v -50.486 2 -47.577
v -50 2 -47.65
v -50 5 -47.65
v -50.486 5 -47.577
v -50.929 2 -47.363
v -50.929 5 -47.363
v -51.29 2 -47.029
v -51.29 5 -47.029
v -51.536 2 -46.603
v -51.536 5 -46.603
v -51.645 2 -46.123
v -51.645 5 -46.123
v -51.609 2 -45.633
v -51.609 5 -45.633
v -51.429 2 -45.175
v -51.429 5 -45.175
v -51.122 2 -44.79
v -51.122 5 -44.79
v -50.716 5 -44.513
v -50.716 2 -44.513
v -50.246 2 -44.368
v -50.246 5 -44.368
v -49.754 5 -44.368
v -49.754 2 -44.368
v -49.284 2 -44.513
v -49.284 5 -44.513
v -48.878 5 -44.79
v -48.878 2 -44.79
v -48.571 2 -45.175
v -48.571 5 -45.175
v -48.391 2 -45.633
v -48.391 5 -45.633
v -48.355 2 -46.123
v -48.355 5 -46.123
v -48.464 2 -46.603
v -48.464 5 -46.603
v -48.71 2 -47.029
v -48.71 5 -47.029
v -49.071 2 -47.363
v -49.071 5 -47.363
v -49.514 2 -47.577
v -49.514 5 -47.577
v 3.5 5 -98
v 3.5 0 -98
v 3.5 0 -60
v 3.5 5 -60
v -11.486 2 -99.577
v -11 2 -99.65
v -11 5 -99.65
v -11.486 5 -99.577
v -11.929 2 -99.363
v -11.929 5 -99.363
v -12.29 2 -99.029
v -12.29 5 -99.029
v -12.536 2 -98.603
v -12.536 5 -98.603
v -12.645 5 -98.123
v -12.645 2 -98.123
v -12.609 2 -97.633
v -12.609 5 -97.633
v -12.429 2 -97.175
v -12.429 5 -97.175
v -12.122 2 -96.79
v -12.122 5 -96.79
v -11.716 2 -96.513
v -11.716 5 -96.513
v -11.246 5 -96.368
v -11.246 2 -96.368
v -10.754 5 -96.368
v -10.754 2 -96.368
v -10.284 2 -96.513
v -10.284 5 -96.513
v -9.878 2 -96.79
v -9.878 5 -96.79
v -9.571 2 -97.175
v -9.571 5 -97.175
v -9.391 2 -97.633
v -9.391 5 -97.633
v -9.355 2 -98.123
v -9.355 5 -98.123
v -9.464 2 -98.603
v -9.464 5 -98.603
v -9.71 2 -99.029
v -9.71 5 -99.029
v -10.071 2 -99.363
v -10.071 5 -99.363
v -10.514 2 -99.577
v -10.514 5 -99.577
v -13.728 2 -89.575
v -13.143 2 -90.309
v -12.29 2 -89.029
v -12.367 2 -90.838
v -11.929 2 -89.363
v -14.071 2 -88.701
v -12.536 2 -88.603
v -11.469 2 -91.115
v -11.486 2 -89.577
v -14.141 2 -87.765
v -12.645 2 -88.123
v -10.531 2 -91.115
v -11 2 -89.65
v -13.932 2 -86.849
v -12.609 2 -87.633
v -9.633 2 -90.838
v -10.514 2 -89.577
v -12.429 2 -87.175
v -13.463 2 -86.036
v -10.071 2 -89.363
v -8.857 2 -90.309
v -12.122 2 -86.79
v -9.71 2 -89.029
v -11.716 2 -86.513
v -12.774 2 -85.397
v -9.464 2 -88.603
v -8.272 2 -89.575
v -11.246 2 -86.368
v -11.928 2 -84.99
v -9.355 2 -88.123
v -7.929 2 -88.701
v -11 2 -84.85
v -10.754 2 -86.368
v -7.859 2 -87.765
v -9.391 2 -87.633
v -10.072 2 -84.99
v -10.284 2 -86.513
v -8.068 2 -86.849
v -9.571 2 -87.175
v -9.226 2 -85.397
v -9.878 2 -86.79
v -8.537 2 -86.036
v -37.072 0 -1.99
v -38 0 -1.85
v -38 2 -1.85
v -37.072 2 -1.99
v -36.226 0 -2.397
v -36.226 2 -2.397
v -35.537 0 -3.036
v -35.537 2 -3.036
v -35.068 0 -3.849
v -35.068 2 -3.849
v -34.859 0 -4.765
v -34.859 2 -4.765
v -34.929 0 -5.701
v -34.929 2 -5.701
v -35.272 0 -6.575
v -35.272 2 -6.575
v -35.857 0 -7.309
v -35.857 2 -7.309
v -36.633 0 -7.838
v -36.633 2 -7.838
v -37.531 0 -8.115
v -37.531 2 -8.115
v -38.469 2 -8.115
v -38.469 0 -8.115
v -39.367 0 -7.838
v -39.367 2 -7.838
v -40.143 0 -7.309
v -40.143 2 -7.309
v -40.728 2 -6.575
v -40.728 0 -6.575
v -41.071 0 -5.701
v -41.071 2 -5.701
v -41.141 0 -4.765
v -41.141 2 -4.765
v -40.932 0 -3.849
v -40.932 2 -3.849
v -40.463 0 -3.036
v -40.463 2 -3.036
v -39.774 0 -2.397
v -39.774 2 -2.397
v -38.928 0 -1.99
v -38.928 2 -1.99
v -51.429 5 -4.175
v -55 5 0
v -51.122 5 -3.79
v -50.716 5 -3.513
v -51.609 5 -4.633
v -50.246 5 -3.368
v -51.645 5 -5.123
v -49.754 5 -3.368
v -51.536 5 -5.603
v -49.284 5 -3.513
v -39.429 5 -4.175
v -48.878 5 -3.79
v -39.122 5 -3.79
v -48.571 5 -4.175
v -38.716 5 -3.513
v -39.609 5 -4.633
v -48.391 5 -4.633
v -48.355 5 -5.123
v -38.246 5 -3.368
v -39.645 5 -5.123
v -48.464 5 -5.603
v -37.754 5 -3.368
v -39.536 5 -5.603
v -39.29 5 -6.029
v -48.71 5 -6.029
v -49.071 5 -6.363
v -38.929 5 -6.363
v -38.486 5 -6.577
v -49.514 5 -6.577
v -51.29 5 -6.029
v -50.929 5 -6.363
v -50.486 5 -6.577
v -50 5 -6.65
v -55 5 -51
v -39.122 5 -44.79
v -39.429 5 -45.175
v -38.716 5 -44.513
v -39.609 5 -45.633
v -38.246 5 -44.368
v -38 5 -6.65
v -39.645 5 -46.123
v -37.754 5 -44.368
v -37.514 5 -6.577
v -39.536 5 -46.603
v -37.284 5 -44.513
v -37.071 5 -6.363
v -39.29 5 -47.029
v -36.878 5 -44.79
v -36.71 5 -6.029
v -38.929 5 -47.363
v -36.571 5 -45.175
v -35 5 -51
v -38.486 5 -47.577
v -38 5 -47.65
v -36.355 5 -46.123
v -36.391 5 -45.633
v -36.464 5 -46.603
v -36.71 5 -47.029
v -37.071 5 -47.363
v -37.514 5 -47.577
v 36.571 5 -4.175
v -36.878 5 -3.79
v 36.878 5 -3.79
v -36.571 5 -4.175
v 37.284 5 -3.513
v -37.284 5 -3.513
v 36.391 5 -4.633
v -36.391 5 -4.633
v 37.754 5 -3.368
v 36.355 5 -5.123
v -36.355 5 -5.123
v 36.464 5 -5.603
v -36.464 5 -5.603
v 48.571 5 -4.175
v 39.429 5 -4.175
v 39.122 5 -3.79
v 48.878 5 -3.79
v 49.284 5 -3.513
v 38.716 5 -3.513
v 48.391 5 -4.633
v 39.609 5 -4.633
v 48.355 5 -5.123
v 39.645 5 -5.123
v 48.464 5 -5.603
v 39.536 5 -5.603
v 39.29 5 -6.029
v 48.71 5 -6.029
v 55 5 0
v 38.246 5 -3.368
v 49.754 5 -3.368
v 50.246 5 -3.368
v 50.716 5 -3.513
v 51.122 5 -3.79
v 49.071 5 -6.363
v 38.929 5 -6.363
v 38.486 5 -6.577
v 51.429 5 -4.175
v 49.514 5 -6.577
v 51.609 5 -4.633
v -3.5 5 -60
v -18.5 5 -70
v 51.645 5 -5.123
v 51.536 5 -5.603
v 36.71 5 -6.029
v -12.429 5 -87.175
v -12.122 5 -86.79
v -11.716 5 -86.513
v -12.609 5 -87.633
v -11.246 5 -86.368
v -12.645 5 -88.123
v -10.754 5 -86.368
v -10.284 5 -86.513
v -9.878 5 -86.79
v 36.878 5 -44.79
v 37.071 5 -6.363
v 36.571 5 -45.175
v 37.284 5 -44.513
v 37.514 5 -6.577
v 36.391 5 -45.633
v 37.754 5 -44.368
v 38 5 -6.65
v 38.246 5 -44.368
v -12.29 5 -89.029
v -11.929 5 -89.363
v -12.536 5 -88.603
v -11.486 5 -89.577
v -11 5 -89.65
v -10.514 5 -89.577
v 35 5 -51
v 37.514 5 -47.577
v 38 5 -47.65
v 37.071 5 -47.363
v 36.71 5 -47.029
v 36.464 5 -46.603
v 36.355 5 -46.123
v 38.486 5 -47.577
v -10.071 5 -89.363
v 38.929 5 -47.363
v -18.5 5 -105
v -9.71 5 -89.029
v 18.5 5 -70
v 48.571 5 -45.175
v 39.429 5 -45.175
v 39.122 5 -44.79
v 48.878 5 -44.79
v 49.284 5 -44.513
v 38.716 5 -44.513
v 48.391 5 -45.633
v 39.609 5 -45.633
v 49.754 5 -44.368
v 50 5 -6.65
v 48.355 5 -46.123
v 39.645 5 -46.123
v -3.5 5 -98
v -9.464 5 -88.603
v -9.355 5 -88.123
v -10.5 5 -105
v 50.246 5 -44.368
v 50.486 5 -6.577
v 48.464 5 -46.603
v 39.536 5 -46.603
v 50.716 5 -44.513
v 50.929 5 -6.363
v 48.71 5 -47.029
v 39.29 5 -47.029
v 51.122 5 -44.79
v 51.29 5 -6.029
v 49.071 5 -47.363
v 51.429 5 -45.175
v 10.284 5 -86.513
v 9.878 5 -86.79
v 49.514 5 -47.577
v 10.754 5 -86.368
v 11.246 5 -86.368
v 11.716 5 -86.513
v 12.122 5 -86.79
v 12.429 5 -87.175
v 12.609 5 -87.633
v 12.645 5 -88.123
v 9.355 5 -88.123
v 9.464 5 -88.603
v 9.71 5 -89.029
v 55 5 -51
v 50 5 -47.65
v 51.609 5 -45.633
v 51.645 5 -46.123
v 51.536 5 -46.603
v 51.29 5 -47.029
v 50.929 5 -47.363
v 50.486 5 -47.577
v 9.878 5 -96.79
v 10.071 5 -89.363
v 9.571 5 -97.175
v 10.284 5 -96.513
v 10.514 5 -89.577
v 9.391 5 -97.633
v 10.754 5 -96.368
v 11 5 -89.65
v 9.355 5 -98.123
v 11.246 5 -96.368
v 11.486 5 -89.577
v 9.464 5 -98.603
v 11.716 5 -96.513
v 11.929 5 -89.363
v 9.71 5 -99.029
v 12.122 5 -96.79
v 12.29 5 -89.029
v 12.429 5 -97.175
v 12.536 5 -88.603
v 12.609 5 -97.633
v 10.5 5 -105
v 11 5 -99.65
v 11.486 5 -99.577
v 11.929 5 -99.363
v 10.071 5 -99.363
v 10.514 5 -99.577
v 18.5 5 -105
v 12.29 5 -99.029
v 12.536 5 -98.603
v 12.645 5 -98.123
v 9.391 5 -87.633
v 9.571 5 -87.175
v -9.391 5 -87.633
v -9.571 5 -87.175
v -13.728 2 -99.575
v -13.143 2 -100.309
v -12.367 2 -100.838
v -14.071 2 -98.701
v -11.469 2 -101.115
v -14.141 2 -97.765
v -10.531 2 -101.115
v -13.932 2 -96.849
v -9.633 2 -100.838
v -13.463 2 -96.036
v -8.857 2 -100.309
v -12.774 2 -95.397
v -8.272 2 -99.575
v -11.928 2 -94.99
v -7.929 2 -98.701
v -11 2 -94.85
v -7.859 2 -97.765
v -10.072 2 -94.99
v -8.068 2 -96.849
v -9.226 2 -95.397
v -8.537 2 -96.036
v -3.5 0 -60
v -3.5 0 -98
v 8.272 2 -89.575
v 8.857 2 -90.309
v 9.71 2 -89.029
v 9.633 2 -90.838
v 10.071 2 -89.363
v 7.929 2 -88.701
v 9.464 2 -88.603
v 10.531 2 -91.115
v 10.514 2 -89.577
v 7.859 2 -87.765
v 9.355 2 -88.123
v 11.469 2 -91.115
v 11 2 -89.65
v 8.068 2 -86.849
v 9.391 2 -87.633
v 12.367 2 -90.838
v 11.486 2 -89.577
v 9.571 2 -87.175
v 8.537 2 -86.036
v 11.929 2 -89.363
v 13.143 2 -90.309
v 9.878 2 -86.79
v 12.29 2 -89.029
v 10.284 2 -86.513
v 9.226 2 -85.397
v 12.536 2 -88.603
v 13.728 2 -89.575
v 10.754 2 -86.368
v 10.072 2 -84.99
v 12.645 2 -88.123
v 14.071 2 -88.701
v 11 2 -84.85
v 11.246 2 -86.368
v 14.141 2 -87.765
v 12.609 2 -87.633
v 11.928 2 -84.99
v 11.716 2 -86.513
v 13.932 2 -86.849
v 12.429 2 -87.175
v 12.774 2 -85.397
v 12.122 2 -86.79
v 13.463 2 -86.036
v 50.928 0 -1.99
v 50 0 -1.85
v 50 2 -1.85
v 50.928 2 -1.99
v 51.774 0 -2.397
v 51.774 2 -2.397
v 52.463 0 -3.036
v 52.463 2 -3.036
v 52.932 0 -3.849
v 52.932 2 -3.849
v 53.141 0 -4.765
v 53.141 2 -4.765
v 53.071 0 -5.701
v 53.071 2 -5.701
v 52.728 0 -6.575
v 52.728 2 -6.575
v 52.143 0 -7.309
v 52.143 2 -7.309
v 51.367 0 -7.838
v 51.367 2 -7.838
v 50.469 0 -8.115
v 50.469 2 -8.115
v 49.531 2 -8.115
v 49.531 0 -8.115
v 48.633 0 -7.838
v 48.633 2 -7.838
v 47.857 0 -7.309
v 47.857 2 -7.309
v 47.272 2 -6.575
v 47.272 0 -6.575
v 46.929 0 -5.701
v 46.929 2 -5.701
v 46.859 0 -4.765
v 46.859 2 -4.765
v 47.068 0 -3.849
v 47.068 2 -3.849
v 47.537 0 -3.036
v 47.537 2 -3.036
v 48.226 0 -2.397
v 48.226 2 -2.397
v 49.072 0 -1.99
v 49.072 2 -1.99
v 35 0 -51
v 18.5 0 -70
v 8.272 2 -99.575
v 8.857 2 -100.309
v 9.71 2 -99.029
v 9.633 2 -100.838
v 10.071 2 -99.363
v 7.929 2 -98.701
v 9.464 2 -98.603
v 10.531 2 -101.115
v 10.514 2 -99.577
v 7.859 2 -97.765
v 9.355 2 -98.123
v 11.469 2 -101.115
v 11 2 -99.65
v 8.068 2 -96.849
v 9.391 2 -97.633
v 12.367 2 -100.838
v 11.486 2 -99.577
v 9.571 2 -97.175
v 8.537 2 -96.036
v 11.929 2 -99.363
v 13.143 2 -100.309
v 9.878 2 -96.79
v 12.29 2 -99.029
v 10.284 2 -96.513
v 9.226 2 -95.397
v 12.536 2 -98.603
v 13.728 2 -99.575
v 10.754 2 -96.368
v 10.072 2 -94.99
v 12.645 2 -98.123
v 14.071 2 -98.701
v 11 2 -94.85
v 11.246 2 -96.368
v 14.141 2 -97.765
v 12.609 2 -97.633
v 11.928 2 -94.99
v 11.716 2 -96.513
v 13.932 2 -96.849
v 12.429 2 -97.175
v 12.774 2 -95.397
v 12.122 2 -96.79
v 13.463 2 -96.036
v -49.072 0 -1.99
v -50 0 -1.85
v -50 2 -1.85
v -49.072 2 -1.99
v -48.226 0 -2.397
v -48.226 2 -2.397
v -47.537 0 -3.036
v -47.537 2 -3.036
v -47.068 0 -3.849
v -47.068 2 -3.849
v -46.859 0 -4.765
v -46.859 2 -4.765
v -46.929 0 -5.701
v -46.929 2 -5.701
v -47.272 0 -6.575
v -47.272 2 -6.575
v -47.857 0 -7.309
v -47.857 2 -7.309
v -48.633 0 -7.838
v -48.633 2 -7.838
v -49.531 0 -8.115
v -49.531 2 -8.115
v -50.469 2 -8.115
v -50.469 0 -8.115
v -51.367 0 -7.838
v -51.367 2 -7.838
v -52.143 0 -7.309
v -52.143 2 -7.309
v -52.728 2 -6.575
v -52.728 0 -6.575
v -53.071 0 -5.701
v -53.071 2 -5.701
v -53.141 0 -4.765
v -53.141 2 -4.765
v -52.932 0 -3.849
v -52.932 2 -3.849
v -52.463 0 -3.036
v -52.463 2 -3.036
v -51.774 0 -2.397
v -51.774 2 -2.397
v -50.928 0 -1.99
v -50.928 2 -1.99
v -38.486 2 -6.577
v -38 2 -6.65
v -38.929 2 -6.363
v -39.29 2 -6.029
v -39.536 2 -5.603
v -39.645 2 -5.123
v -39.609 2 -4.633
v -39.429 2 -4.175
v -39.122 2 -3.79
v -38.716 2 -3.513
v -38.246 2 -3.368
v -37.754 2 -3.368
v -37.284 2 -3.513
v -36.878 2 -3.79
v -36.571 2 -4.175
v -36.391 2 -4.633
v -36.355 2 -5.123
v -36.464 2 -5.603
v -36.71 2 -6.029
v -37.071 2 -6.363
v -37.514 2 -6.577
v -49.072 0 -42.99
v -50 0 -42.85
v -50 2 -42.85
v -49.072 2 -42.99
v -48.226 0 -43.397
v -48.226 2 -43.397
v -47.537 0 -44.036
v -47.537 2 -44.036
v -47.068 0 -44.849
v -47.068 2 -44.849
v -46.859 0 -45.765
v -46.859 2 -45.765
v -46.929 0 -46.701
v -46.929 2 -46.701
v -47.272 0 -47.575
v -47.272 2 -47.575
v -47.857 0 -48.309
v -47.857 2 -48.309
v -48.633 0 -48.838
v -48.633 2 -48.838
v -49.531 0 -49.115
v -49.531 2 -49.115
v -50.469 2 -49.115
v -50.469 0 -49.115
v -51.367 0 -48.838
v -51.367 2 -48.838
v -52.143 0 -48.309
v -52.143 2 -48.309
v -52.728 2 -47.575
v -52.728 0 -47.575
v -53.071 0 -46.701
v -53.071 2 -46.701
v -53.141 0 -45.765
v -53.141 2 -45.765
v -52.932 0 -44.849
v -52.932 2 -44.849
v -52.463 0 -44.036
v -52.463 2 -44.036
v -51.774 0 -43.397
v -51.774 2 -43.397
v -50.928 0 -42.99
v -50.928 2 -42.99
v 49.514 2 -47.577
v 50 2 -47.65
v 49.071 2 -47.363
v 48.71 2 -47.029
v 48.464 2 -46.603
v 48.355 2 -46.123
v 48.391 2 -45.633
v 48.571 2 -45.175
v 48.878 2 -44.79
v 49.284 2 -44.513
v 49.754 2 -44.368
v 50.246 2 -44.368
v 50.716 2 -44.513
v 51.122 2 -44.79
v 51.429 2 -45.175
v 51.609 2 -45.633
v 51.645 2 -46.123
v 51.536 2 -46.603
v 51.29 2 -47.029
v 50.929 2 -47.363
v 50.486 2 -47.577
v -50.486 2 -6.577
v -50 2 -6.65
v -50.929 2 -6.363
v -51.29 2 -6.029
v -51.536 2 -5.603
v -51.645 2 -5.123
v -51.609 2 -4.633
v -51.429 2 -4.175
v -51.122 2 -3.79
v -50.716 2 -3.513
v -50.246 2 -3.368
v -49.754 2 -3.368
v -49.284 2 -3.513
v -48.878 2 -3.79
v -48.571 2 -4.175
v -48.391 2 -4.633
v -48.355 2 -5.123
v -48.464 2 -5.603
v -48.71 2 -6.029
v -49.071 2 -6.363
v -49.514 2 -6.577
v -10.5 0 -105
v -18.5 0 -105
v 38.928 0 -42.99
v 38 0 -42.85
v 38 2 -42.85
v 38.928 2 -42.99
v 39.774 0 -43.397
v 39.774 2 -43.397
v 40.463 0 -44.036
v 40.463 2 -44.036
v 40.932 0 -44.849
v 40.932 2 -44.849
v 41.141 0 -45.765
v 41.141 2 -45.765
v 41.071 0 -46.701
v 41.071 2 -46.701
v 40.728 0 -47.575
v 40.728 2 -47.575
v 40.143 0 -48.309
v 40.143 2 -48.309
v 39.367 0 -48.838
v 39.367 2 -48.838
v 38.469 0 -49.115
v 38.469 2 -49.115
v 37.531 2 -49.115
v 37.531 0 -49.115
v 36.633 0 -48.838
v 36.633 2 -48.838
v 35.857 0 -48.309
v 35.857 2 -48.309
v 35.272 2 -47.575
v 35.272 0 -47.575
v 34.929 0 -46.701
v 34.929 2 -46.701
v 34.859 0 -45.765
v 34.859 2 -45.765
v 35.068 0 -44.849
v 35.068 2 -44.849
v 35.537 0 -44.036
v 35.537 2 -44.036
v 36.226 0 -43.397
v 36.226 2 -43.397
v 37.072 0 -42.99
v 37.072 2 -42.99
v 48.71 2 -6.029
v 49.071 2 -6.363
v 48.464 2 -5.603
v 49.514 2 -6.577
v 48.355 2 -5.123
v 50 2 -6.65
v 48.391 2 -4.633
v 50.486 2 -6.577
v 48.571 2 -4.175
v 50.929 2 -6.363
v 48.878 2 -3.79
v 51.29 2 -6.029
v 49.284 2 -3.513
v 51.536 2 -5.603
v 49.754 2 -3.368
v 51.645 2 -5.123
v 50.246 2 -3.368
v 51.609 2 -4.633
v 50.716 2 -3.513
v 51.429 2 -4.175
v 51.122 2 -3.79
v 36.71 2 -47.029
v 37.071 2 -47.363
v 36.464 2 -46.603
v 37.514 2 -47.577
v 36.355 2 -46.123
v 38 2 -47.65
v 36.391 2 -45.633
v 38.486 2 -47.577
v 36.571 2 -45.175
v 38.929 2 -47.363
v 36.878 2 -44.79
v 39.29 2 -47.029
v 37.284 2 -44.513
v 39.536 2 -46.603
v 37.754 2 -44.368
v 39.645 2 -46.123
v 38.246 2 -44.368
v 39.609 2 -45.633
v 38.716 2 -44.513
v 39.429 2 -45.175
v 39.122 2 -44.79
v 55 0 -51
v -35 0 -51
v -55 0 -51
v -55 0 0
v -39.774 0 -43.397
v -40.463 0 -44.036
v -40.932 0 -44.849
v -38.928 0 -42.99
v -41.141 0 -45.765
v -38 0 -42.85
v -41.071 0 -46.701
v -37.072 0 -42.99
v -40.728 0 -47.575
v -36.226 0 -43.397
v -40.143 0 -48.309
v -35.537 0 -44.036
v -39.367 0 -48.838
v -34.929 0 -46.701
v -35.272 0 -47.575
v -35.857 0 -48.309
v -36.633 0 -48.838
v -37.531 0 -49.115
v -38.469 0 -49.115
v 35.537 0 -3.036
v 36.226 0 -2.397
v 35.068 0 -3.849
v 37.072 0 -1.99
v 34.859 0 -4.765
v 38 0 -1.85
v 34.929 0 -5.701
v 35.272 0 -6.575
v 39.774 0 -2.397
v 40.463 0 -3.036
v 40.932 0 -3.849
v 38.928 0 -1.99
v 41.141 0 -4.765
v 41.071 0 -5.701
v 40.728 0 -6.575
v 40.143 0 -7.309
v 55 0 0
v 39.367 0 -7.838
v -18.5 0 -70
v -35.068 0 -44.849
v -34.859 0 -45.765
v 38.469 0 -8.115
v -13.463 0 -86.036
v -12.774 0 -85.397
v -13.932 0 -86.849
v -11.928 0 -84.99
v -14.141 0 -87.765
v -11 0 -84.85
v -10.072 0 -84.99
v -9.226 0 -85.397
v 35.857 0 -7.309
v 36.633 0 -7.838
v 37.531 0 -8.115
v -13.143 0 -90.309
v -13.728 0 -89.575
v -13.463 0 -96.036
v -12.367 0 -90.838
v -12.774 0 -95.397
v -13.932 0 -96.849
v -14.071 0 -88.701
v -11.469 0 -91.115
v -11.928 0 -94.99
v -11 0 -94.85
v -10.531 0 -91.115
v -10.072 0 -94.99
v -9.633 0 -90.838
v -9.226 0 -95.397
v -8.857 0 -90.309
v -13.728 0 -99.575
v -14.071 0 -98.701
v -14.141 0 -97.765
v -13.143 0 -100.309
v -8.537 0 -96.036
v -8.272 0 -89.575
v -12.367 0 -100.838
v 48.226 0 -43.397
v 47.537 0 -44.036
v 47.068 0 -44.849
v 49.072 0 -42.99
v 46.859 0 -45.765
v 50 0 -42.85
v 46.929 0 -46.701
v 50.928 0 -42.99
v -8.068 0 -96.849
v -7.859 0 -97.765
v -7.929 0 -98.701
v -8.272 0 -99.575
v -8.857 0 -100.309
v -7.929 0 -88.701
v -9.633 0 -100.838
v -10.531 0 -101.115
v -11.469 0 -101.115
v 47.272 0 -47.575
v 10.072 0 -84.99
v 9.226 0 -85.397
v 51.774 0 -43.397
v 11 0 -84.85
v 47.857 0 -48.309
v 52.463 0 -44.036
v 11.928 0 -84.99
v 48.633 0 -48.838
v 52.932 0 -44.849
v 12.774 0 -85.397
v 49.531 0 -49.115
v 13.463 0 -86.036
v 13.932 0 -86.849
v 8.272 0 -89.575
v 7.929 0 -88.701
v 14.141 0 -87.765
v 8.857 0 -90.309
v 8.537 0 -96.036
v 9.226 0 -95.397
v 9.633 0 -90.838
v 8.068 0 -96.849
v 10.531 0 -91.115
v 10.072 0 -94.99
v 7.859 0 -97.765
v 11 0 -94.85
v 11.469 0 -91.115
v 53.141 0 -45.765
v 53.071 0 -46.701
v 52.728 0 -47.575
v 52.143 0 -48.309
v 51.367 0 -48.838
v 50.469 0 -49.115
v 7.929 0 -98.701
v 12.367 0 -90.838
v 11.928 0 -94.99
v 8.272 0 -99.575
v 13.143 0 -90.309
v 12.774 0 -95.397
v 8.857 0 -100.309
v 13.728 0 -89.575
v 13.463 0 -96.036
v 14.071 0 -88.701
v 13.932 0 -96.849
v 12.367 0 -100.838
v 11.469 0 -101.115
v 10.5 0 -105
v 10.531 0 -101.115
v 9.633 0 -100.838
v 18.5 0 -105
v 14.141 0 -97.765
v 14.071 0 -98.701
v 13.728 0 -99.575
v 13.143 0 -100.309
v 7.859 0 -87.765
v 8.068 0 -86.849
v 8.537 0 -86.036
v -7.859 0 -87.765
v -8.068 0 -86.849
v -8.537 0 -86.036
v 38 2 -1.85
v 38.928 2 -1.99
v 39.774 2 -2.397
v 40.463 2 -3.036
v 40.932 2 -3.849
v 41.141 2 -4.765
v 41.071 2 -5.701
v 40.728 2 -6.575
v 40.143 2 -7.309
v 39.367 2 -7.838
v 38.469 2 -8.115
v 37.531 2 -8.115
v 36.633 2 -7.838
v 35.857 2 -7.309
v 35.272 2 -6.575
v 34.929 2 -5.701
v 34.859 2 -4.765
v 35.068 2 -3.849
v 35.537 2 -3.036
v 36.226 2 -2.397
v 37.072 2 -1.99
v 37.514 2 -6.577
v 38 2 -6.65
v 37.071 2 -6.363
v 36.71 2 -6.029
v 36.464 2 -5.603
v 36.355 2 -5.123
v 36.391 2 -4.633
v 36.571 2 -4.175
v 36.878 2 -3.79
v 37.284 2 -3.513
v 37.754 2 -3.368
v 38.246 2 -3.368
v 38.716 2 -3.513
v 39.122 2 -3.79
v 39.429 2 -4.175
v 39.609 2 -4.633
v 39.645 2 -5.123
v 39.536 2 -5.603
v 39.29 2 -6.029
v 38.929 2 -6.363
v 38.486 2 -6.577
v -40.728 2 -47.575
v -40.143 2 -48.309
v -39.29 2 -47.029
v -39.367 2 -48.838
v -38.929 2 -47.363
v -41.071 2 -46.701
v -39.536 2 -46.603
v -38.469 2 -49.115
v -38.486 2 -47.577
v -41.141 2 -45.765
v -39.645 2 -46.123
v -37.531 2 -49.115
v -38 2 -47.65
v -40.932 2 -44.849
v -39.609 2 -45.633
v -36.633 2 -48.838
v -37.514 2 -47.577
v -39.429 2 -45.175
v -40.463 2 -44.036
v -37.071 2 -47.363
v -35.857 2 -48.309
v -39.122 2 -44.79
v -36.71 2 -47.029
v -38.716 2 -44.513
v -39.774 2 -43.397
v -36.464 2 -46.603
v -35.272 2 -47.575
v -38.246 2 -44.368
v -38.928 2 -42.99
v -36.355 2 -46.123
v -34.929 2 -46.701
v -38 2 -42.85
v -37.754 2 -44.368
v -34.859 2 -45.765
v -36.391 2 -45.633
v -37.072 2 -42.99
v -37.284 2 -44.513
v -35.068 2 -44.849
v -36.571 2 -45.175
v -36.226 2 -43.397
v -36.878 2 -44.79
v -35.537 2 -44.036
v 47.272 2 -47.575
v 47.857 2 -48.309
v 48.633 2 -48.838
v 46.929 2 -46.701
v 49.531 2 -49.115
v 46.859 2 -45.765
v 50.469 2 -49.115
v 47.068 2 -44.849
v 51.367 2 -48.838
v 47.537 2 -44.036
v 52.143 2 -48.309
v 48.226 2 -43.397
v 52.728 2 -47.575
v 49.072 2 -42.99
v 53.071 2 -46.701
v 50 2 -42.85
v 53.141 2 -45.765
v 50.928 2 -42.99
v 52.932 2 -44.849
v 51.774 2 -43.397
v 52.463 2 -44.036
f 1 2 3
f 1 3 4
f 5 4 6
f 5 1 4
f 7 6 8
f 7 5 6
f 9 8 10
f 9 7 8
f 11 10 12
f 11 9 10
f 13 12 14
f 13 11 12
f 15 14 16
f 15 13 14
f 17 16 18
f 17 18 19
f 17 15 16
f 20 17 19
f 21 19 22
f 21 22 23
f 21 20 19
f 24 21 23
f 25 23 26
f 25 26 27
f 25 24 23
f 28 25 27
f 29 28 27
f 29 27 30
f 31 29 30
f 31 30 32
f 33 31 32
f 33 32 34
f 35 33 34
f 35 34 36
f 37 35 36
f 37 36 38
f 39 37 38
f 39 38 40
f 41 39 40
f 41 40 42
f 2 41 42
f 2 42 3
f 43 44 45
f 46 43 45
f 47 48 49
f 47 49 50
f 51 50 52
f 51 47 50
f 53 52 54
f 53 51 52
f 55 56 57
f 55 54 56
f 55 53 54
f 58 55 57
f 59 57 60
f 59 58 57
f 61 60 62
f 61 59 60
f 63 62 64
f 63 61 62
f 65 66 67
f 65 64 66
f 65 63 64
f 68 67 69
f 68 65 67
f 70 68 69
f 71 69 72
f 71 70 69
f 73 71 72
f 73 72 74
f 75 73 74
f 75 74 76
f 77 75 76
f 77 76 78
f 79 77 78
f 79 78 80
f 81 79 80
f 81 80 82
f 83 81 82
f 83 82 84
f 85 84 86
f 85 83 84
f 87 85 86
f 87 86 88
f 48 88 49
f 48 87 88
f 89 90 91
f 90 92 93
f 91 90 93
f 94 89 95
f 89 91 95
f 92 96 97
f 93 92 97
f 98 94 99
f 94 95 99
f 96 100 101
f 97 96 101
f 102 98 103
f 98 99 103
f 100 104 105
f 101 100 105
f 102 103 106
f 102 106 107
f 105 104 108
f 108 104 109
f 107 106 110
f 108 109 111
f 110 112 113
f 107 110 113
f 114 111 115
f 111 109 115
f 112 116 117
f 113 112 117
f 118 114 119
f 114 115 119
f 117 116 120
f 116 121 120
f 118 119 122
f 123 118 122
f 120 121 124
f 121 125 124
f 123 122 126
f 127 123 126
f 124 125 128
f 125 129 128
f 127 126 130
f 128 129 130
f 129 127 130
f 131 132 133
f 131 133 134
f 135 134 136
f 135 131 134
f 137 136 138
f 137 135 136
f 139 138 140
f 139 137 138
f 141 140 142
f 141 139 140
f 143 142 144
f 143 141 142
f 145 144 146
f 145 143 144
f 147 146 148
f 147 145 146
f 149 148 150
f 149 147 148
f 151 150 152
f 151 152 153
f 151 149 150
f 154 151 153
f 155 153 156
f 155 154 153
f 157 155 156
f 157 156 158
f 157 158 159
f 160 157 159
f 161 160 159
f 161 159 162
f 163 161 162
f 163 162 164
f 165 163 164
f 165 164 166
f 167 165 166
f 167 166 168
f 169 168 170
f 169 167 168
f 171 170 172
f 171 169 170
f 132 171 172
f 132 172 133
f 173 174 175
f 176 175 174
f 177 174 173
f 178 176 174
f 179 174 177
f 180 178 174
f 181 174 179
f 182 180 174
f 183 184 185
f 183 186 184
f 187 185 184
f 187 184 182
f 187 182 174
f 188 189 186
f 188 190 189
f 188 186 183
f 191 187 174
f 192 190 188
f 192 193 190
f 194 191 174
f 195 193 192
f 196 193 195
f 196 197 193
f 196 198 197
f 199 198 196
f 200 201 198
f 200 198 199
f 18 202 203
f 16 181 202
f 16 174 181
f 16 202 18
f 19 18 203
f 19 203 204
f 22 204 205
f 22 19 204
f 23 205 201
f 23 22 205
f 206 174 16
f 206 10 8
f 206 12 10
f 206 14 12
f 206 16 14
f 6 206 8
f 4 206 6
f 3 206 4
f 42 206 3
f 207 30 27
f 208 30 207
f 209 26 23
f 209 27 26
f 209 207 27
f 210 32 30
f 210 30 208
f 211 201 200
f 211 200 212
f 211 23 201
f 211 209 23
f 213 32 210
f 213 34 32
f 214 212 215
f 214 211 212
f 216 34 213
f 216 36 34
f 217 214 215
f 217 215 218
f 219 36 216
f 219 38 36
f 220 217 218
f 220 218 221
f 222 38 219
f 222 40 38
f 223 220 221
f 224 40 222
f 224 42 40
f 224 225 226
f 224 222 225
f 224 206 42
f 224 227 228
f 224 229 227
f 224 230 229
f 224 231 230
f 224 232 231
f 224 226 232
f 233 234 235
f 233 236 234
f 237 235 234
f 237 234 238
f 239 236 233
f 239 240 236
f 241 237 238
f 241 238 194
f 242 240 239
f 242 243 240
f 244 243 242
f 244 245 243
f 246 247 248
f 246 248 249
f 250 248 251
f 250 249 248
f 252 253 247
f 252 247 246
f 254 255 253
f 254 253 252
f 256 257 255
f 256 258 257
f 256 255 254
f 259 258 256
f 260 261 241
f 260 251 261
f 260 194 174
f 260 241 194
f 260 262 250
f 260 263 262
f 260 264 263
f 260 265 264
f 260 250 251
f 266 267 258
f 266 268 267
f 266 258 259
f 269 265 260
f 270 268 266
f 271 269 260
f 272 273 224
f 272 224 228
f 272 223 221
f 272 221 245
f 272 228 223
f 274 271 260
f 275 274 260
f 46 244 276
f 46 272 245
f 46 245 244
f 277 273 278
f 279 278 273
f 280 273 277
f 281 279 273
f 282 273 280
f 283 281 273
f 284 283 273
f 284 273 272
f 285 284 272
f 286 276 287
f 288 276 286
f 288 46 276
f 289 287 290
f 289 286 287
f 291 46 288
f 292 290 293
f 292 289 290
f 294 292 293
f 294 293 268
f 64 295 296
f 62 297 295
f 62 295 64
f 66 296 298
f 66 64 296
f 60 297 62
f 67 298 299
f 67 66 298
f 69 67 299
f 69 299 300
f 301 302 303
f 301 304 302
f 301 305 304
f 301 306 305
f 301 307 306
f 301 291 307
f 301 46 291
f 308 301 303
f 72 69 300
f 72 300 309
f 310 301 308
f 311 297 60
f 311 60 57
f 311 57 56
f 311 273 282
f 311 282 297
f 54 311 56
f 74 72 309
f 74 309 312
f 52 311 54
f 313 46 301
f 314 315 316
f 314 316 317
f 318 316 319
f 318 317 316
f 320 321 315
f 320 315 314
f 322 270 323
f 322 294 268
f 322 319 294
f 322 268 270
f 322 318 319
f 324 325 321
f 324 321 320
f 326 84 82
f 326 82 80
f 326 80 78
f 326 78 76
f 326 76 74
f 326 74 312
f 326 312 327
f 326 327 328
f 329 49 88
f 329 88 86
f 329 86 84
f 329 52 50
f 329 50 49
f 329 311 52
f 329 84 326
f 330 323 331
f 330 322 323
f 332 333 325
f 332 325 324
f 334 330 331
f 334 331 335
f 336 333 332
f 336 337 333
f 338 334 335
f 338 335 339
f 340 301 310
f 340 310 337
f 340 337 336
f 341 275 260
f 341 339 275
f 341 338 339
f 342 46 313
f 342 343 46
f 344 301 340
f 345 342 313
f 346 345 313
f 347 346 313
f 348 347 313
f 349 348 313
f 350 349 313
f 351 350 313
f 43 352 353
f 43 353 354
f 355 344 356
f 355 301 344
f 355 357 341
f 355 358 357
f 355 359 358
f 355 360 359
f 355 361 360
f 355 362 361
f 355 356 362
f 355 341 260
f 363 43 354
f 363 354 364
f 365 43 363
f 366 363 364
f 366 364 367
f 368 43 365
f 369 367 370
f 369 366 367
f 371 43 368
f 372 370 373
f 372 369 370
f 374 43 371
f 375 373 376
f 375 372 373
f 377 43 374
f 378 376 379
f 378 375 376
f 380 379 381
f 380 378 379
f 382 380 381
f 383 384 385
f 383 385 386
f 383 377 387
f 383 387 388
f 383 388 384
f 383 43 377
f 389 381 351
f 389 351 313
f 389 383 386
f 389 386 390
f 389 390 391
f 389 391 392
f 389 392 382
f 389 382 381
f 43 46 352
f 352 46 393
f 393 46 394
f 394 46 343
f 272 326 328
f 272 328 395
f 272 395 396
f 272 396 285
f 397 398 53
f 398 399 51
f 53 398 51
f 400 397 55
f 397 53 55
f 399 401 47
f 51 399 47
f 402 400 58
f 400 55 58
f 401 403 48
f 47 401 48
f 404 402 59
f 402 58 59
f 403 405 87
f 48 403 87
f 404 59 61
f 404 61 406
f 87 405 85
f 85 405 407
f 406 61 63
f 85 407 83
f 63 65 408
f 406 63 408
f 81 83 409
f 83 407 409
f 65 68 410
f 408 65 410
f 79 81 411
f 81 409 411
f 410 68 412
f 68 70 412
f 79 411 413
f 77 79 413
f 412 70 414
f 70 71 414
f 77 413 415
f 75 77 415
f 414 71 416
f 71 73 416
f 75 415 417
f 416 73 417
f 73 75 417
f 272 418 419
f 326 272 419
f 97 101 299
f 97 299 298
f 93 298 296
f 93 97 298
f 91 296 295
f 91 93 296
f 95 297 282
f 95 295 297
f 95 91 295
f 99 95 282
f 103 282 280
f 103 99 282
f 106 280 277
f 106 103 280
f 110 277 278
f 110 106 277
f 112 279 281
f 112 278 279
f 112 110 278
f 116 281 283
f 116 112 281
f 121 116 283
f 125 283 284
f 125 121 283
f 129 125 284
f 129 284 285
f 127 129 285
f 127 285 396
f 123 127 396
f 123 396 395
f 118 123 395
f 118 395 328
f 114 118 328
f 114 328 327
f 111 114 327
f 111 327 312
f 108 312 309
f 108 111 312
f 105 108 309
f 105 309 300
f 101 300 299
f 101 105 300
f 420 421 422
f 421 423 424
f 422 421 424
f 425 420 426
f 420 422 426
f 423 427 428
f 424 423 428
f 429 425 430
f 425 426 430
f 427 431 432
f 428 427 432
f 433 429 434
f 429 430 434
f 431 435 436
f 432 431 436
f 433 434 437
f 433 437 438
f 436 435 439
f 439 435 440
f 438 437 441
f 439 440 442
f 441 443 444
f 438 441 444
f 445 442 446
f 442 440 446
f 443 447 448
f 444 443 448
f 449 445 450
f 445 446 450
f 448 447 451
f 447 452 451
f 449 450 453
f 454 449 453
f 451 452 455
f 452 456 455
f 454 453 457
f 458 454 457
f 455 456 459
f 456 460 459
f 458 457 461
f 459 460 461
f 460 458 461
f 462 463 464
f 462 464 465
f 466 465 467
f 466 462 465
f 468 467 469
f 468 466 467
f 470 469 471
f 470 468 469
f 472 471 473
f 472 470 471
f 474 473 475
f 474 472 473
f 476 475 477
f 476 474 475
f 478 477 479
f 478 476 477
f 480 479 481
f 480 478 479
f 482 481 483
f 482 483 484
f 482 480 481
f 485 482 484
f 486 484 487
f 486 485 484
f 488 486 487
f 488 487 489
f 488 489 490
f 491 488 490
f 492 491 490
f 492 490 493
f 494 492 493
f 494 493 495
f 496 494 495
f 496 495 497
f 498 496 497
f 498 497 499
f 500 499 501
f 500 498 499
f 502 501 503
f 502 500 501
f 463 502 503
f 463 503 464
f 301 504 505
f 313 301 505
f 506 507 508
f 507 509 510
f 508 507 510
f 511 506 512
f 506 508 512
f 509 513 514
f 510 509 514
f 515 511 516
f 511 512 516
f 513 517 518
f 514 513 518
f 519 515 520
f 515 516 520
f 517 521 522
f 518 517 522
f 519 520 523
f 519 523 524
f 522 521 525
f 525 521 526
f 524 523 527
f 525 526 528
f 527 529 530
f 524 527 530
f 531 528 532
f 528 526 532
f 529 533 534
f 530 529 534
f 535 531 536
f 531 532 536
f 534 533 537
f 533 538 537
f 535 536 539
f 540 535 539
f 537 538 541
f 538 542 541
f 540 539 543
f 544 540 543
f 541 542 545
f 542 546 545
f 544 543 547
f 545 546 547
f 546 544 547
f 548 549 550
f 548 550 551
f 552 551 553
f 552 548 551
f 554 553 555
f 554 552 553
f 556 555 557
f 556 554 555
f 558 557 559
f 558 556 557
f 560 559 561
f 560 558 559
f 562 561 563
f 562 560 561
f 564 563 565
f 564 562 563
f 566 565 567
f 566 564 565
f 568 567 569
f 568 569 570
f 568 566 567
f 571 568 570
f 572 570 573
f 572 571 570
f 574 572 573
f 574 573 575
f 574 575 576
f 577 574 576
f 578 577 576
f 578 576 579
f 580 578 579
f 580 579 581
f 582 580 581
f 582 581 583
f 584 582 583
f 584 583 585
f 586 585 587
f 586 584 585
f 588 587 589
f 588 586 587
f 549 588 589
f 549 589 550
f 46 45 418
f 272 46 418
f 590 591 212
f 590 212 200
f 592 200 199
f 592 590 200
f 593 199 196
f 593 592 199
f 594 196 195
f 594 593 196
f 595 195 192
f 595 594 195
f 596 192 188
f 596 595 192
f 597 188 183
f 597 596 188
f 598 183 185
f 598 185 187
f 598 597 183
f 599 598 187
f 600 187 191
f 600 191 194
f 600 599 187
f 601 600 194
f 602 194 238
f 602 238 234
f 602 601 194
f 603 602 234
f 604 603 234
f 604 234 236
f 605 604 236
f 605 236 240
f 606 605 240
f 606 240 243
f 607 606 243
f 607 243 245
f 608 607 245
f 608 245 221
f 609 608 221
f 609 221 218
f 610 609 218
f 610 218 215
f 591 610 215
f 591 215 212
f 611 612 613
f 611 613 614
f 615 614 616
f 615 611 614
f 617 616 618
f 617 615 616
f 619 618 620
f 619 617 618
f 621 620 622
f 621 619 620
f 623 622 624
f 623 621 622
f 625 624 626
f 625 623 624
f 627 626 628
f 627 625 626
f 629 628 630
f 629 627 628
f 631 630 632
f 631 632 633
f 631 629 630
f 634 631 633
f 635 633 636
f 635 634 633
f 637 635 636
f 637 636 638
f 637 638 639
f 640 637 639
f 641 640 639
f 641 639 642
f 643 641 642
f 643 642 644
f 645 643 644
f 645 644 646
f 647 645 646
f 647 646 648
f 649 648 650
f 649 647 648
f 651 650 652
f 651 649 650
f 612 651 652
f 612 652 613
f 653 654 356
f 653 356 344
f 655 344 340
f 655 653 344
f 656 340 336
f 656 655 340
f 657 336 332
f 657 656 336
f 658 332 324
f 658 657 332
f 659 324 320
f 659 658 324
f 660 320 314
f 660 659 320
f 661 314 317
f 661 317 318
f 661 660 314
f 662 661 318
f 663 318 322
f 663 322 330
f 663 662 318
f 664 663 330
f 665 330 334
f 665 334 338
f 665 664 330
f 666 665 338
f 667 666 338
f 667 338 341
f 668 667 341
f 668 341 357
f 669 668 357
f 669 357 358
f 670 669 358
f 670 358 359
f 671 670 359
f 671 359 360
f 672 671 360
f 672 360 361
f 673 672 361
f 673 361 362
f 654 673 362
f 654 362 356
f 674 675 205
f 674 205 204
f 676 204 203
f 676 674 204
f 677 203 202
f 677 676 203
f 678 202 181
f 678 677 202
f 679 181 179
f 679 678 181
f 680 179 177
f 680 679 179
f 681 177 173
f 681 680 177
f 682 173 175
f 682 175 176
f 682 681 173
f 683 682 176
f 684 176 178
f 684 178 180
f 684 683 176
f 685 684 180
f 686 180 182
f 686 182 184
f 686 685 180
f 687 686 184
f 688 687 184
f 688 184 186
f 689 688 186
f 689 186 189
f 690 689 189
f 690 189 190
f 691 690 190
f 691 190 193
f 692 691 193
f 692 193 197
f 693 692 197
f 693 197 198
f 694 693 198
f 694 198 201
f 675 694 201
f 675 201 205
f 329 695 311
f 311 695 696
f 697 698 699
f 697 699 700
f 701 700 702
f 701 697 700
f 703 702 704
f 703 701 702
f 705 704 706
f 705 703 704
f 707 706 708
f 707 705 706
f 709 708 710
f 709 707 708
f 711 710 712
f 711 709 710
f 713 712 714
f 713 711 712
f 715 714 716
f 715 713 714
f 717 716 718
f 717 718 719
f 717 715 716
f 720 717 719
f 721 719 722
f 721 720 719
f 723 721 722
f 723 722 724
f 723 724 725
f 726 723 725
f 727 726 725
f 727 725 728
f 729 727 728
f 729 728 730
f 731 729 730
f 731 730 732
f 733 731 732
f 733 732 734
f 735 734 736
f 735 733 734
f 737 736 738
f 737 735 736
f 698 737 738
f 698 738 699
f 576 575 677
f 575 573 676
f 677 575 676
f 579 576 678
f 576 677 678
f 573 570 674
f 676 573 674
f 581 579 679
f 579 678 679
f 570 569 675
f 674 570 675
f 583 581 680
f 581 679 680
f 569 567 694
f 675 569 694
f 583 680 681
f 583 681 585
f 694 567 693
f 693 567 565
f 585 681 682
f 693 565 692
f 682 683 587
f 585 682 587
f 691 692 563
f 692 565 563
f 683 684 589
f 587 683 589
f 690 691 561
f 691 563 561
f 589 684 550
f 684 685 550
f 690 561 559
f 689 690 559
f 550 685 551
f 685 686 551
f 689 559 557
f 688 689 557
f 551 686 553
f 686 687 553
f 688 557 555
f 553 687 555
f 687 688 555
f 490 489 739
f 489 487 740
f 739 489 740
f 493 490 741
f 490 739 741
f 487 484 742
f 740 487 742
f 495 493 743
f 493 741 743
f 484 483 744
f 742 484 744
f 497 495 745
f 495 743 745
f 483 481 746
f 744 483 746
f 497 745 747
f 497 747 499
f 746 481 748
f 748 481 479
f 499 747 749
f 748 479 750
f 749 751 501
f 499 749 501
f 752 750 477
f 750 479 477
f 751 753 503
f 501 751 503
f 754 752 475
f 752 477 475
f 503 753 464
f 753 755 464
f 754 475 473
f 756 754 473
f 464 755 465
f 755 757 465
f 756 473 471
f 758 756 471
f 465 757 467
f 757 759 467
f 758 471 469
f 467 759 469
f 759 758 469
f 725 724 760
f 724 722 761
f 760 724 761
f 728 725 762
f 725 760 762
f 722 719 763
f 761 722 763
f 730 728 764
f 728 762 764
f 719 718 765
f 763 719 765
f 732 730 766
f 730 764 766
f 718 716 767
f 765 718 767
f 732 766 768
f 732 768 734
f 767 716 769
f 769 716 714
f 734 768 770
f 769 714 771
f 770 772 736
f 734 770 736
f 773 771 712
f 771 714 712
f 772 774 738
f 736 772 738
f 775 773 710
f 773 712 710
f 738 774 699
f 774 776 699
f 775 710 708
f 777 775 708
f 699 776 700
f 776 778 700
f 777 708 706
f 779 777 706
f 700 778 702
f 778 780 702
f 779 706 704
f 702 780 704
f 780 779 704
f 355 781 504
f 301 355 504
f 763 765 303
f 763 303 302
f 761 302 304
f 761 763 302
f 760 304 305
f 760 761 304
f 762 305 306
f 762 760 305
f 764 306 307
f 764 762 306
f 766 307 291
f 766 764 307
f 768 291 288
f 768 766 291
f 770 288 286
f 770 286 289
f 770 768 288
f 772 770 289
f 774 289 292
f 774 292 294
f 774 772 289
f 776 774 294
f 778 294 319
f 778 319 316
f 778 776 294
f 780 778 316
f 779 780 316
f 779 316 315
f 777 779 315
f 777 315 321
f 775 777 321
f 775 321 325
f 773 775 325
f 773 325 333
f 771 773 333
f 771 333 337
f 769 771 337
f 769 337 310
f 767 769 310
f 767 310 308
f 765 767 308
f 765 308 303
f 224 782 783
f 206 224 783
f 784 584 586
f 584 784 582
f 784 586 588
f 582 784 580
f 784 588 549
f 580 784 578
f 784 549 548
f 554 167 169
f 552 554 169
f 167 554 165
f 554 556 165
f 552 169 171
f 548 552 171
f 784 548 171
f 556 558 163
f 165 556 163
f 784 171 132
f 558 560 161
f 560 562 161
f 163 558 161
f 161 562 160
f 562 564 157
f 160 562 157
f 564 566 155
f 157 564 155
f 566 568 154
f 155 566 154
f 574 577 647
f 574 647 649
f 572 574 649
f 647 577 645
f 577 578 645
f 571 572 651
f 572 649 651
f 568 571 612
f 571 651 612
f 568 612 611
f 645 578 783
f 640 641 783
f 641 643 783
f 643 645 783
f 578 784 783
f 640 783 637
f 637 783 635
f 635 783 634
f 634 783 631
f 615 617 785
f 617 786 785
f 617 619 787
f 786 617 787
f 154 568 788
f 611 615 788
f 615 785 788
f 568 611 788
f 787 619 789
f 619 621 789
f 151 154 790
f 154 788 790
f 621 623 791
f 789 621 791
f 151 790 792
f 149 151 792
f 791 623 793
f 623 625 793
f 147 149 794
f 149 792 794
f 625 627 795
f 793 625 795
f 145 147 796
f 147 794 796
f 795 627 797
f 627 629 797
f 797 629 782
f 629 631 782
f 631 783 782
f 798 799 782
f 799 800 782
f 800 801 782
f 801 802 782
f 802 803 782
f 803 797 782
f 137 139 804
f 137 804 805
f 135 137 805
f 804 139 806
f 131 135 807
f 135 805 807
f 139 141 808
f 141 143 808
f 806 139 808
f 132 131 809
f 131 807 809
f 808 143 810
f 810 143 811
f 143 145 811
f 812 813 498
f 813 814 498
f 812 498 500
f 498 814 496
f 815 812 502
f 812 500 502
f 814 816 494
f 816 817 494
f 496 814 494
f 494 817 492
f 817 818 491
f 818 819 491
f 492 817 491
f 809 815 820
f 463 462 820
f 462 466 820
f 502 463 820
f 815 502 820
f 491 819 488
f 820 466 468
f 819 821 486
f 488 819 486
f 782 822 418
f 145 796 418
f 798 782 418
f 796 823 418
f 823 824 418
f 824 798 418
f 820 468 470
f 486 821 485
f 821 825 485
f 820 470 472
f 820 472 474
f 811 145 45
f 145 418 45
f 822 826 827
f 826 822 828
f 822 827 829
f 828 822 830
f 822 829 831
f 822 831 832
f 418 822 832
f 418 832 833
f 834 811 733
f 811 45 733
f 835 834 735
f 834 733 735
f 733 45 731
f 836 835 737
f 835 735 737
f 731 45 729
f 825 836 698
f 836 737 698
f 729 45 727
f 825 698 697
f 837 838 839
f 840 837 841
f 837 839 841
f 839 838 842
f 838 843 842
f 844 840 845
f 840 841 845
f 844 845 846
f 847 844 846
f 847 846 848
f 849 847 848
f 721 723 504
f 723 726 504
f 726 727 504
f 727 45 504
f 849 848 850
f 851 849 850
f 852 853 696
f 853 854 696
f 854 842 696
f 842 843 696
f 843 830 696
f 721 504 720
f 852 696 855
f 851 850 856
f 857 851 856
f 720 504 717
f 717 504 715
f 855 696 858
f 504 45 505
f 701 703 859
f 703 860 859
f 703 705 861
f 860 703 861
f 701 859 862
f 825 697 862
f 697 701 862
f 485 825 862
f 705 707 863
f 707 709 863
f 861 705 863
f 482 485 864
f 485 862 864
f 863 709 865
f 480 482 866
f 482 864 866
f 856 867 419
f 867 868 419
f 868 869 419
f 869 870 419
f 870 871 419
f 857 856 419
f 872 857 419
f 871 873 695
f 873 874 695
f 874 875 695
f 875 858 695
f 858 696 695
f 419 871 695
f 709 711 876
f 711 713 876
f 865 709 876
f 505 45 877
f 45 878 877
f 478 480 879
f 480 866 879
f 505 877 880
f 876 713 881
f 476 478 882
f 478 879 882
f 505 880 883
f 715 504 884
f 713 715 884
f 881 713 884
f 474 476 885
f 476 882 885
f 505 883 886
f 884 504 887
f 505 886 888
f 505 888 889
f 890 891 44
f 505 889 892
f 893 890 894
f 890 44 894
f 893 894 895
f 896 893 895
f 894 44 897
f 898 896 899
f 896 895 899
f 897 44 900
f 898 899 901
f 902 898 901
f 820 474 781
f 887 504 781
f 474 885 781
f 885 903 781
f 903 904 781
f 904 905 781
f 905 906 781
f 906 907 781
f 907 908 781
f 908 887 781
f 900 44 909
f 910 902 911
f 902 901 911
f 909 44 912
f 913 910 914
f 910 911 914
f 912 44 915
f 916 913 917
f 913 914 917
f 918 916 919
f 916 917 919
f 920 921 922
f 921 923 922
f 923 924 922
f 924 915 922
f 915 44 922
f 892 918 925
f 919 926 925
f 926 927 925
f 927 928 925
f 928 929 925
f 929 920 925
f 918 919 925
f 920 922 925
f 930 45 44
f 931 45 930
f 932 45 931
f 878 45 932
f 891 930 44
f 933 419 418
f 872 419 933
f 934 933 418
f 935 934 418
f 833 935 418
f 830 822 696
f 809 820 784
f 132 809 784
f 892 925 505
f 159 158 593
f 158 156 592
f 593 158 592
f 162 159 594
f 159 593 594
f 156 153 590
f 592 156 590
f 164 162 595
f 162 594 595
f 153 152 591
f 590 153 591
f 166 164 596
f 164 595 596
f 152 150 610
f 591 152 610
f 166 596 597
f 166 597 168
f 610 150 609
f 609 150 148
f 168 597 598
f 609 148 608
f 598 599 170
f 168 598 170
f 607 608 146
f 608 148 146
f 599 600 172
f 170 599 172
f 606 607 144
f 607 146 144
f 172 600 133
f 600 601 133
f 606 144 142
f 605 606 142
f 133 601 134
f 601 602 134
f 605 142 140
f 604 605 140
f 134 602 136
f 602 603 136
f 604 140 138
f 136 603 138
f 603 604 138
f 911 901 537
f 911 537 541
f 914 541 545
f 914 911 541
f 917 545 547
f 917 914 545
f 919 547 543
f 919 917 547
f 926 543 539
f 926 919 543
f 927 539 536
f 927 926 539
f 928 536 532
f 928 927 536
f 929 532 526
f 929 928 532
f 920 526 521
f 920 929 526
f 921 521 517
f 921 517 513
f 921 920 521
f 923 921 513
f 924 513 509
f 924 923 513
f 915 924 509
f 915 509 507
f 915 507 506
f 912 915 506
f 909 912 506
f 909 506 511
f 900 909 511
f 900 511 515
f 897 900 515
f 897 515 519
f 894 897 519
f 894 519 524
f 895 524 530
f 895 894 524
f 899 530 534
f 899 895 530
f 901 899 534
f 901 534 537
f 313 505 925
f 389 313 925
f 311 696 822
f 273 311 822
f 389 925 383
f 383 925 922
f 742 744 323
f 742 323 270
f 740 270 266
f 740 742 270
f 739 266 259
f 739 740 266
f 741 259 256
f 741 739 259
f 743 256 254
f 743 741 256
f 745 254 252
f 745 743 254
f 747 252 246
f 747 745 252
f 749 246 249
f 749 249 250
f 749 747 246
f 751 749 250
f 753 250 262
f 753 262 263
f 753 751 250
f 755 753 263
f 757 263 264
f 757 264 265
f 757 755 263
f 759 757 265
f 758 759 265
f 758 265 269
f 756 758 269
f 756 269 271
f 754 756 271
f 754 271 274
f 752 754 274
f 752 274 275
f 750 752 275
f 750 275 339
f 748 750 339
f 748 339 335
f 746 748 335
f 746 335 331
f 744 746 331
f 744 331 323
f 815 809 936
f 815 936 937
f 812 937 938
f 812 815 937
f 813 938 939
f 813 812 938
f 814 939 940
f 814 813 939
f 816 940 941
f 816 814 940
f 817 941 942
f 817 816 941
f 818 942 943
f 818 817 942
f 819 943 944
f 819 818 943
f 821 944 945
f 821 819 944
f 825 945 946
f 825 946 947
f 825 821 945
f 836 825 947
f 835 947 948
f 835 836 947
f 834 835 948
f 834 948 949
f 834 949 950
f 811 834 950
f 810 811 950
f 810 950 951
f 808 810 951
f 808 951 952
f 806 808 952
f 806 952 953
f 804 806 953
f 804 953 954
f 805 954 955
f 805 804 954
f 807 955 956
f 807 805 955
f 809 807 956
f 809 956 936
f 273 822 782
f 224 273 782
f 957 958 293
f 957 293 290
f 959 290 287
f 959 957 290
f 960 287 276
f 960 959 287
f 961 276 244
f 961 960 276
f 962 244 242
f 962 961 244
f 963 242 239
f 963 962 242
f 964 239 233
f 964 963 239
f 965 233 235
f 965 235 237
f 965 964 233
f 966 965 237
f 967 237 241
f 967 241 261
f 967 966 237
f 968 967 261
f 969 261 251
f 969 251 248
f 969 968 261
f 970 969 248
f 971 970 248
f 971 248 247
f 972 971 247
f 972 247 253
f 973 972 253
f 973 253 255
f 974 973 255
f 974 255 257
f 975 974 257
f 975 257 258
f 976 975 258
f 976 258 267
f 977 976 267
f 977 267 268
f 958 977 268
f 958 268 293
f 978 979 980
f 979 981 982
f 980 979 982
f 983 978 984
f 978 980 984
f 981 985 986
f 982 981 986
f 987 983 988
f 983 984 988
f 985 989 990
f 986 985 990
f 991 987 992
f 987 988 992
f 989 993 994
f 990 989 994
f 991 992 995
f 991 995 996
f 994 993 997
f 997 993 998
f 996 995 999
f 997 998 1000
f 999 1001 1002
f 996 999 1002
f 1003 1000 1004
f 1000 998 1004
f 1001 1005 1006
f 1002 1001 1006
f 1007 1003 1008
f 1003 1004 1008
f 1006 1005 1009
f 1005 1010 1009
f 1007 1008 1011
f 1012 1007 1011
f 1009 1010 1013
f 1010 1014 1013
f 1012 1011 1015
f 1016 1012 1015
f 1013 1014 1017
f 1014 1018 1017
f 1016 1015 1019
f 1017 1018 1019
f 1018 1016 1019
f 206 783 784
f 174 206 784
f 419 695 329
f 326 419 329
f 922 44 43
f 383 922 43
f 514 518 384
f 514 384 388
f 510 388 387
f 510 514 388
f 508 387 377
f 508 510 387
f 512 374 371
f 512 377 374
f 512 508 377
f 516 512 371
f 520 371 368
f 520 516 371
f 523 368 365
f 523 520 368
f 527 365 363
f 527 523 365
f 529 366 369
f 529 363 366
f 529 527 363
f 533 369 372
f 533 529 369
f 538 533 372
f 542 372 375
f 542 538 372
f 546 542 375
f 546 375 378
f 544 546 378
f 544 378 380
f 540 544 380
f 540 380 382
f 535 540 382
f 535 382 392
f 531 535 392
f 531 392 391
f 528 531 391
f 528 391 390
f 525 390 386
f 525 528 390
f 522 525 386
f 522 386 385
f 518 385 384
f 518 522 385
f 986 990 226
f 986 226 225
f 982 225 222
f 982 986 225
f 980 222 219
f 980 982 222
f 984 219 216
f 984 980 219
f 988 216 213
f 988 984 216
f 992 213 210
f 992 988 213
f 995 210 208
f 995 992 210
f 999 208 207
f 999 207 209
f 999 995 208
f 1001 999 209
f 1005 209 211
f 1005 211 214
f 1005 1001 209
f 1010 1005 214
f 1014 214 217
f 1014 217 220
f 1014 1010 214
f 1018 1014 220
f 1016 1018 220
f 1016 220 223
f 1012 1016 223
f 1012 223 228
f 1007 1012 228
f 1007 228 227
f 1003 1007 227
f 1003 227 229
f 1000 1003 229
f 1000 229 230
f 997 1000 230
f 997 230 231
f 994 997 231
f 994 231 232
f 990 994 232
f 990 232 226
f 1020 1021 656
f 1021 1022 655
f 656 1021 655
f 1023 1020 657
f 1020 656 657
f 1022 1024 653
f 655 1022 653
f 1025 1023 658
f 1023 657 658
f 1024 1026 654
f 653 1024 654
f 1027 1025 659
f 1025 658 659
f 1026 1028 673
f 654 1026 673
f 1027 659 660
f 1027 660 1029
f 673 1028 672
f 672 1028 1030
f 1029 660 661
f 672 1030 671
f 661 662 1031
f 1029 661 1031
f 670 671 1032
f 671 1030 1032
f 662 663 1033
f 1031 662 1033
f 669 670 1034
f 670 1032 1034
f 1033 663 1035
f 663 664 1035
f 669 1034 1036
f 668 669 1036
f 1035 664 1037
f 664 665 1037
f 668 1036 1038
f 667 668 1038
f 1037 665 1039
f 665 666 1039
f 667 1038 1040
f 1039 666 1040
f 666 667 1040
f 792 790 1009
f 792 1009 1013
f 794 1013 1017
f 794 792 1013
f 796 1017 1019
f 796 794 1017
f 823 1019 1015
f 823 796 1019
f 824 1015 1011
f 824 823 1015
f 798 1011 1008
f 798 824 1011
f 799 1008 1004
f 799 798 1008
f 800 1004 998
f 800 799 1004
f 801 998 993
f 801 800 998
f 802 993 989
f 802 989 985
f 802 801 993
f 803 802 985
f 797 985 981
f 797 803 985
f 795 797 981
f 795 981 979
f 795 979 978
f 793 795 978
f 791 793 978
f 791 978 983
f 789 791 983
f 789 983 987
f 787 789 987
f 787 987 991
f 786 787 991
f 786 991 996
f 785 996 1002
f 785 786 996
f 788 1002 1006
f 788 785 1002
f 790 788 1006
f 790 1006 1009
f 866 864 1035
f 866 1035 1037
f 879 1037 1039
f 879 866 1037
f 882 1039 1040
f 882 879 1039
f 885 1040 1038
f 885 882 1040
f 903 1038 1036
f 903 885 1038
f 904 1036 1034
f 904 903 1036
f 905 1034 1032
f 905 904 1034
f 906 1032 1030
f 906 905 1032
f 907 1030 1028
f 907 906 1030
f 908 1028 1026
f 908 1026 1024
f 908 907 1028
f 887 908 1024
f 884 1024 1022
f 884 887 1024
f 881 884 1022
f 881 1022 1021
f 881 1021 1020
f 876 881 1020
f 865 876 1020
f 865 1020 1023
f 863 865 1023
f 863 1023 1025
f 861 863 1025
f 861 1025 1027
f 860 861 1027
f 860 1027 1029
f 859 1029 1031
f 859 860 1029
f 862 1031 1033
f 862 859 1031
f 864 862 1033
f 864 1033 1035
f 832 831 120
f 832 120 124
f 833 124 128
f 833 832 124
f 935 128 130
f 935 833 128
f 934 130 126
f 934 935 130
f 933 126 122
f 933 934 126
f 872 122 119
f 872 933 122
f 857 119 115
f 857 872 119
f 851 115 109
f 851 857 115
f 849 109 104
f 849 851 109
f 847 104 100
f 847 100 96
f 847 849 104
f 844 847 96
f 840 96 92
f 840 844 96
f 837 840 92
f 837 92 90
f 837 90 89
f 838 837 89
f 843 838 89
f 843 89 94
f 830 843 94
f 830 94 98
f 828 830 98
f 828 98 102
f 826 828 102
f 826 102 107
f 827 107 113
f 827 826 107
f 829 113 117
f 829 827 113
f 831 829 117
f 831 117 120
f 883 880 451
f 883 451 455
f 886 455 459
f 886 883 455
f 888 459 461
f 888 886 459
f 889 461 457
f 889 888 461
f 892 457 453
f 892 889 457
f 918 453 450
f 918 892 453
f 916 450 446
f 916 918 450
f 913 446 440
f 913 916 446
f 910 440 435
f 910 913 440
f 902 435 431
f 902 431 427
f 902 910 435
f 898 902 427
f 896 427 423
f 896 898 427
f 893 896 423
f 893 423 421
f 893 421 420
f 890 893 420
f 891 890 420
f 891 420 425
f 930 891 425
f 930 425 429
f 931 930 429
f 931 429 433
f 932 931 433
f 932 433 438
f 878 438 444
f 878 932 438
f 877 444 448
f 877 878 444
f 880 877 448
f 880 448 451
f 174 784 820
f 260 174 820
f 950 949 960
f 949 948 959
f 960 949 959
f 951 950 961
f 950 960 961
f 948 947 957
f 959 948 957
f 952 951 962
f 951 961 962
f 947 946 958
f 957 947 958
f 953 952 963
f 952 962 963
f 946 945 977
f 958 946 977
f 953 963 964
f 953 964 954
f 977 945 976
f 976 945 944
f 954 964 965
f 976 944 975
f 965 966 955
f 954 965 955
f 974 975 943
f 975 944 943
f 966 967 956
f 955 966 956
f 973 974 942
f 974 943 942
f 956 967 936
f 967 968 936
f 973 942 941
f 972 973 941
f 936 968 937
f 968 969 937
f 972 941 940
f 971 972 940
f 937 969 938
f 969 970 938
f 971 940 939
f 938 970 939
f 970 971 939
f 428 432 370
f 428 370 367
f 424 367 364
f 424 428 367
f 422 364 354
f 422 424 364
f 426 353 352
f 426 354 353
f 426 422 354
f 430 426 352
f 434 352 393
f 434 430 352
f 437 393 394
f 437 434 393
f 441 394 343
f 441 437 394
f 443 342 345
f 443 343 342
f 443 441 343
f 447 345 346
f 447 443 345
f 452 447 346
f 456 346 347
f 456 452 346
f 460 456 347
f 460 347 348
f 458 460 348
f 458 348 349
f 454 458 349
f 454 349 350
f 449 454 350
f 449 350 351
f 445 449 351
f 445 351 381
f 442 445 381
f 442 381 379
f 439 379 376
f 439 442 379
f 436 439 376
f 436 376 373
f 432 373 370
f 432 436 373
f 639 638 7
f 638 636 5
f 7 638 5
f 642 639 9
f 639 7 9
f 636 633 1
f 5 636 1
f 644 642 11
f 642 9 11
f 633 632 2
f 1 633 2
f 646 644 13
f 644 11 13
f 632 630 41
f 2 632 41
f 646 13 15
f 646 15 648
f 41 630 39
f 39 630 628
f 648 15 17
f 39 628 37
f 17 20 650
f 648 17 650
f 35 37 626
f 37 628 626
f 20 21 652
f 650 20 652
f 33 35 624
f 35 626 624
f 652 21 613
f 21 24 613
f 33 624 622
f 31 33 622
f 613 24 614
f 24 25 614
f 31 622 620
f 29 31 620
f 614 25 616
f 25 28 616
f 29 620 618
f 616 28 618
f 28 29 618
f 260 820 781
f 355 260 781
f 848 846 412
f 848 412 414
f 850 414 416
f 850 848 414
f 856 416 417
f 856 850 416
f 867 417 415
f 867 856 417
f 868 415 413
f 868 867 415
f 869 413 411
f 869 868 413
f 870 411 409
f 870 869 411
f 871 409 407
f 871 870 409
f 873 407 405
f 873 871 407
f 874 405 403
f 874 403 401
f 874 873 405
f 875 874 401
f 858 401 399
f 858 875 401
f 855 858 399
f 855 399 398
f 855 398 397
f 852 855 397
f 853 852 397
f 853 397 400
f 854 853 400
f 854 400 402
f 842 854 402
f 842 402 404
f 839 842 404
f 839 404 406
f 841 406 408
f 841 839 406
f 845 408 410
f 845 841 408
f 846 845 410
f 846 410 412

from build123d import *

# Parameters (mm, degrees)
BOSS_EXTRUDE1_DEPTH = 5
SKETCH2_R           = 1.65
CUT_EXTRUDE1_DEPTH  = 5
SKETCH3_R           = 1.65
CUT_EXTRUDE2_DEPTH  = 19
CHAMFER1_SIZE       = 7
SKETCH4_R           = 3.15
CUT_EXTRUDE4_DEPTH  = 2


# Read off the part's stored shape, not the designer's step: Boss-Extrude1
with BuildPart() as part:
    # Boss-Extrude1 outline → Boss-Extrude1 (new body)
    with BuildSketch(Plane(origin=(0, 0, 0), x_dir=(1, 0, 0), z_dir=(0, 1, 0))):
        Polygon((18.5, 105), (3.5, 105), (3.5, 60), (-3.5, 60), (-3.5, 105), (-18.5, 105), (-18.5, 70), (-35, 51), (-55, 51), (-55, 0), (55, 0), (55, 51), (35, 51), (18.5, 70), align=None)
    extrude(amount=BOSS_EXTRUDE1_DEPTH)

    # Sketch2 → Cut-Extrude1 (cut)
    with BuildSketch(Plane(origin=(0, 0, 0), x_dir=(1, 0, 0), z_dir=(0, 1, 0))):
        with Locations(Location((-50, 5, 0), (0, 0, 90))):
            Circle(SKETCH2_R)
        with Locations(Location((-38, 5, 0), (0, 0, 90))):
            Circle(SKETCH2_R)
        with Locations(Location((50, 5, 0), (0, 0, 90))):
            Circle(SKETCH2_R)
        with Locations(Location((38, 5, 0), (0, 0, 90))):
            Circle(SKETCH2_R)
        with Locations(Location((-50, 46, 0), (0, 0, 90))):
            Circle(SKETCH2_R)
        with Locations(Location((-38, 46, 0), (0, 0, 90))):
            Circle(SKETCH2_R)
        with Locations(Location((50, 46, 0), (0, 0, 90))):
            Circle(SKETCH2_R)
        with Locations(Location((38, 46, 0), (0, 0, 90))):
            Circle(SKETCH2_R)
    extrude(amount=CUT_EXTRUDE1_DEPTH, mode=Mode.SUBTRACT)

    # Sketch3 → Cut-Extrude2 (cut)
    with BuildSketch(Plane(origin=(0, 0, 0), x_dir=(1, 0, 0), z_dir=(0, 1, 0))):
        with Locations(Location((-11, 88, 0), (0, 0, 90))):
            Circle(SKETCH3_R)
        with Locations(Location((11, 88, 0), (0, 0, 90))):
            Circle(SKETCH3_R)
        with Locations(Location((11, 98, 0), (0, 0, 90))):
            Circle(SKETCH3_R)
        with Locations(Location((-11, 98, 0), (0, 0, 90))):
            Circle(SKETCH3_R)
    extrude(amount=CUT_EXTRUDE2_DEPTH, mode=Mode.SUBTRACT)

    # Chamfer1
    chamfer1_edges = [part.edges().sort_by_distance(p)[0] for p in [
        (-3.5, 2.5, -105),
        (3.5, 2.5, -105),
    ]]
    chamfer(chamfer1_edges, length=CHAMFER1_SIZE)

    # Sketch4 → Cut-Extrude4 (cut)
    with BuildSketch(Plane(origin=(0, 0, 0), x_dir=(1, 0, 0), z_dir=(0, 1, 0))):
        with Locations(Location((-11, 98, 0), (0, 0, 270))):
            Circle(SKETCH4_R)
        with Locations(Location((11, 98, 0), (0, 0, 270))):
            Circle(SKETCH4_R)
        with Locations(Location((-11, 88, 0), (0, 0, 270))):
            Circle(SKETCH4_R)
        with Locations(Location((11, 88, 0), (0, 0, 270))):
            Circle(SKETCH4_R)
        with Locations(Location((-50, 46, 0), (0, 0, 270))):
            Circle(SKETCH4_R)
        with Locations(Location((-38, 46, 0), (0, 0, 270))):
            Circle(SKETCH4_R)
        with Locations(Location((38, 46, 0), (0, 0, 270))):
            Circle(SKETCH4_R)
        with Locations(Location((50, 46, 0), (0, 0, 270))):
            Circle(SKETCH4_R)
        with Locations(Location((38, 5, 0), (0, 0, 270))):
            Circle(SKETCH4_R)
        with Locations(Location((50, 5, 0), (0, 0, 270))):
            Circle(SKETCH4_R)
        with Locations(Location((-50, 5, 0), (0, 0, 270))):
            Circle(SKETCH4_R)
        with Locations(Location((-38, 5, 0), (0, 0, 270))):
            Circle(SKETCH4_R)
    extrude(amount=CUT_EXTRUDE4_DEPTH, mode=Mode.SUBTRACT)


solid = part.part
